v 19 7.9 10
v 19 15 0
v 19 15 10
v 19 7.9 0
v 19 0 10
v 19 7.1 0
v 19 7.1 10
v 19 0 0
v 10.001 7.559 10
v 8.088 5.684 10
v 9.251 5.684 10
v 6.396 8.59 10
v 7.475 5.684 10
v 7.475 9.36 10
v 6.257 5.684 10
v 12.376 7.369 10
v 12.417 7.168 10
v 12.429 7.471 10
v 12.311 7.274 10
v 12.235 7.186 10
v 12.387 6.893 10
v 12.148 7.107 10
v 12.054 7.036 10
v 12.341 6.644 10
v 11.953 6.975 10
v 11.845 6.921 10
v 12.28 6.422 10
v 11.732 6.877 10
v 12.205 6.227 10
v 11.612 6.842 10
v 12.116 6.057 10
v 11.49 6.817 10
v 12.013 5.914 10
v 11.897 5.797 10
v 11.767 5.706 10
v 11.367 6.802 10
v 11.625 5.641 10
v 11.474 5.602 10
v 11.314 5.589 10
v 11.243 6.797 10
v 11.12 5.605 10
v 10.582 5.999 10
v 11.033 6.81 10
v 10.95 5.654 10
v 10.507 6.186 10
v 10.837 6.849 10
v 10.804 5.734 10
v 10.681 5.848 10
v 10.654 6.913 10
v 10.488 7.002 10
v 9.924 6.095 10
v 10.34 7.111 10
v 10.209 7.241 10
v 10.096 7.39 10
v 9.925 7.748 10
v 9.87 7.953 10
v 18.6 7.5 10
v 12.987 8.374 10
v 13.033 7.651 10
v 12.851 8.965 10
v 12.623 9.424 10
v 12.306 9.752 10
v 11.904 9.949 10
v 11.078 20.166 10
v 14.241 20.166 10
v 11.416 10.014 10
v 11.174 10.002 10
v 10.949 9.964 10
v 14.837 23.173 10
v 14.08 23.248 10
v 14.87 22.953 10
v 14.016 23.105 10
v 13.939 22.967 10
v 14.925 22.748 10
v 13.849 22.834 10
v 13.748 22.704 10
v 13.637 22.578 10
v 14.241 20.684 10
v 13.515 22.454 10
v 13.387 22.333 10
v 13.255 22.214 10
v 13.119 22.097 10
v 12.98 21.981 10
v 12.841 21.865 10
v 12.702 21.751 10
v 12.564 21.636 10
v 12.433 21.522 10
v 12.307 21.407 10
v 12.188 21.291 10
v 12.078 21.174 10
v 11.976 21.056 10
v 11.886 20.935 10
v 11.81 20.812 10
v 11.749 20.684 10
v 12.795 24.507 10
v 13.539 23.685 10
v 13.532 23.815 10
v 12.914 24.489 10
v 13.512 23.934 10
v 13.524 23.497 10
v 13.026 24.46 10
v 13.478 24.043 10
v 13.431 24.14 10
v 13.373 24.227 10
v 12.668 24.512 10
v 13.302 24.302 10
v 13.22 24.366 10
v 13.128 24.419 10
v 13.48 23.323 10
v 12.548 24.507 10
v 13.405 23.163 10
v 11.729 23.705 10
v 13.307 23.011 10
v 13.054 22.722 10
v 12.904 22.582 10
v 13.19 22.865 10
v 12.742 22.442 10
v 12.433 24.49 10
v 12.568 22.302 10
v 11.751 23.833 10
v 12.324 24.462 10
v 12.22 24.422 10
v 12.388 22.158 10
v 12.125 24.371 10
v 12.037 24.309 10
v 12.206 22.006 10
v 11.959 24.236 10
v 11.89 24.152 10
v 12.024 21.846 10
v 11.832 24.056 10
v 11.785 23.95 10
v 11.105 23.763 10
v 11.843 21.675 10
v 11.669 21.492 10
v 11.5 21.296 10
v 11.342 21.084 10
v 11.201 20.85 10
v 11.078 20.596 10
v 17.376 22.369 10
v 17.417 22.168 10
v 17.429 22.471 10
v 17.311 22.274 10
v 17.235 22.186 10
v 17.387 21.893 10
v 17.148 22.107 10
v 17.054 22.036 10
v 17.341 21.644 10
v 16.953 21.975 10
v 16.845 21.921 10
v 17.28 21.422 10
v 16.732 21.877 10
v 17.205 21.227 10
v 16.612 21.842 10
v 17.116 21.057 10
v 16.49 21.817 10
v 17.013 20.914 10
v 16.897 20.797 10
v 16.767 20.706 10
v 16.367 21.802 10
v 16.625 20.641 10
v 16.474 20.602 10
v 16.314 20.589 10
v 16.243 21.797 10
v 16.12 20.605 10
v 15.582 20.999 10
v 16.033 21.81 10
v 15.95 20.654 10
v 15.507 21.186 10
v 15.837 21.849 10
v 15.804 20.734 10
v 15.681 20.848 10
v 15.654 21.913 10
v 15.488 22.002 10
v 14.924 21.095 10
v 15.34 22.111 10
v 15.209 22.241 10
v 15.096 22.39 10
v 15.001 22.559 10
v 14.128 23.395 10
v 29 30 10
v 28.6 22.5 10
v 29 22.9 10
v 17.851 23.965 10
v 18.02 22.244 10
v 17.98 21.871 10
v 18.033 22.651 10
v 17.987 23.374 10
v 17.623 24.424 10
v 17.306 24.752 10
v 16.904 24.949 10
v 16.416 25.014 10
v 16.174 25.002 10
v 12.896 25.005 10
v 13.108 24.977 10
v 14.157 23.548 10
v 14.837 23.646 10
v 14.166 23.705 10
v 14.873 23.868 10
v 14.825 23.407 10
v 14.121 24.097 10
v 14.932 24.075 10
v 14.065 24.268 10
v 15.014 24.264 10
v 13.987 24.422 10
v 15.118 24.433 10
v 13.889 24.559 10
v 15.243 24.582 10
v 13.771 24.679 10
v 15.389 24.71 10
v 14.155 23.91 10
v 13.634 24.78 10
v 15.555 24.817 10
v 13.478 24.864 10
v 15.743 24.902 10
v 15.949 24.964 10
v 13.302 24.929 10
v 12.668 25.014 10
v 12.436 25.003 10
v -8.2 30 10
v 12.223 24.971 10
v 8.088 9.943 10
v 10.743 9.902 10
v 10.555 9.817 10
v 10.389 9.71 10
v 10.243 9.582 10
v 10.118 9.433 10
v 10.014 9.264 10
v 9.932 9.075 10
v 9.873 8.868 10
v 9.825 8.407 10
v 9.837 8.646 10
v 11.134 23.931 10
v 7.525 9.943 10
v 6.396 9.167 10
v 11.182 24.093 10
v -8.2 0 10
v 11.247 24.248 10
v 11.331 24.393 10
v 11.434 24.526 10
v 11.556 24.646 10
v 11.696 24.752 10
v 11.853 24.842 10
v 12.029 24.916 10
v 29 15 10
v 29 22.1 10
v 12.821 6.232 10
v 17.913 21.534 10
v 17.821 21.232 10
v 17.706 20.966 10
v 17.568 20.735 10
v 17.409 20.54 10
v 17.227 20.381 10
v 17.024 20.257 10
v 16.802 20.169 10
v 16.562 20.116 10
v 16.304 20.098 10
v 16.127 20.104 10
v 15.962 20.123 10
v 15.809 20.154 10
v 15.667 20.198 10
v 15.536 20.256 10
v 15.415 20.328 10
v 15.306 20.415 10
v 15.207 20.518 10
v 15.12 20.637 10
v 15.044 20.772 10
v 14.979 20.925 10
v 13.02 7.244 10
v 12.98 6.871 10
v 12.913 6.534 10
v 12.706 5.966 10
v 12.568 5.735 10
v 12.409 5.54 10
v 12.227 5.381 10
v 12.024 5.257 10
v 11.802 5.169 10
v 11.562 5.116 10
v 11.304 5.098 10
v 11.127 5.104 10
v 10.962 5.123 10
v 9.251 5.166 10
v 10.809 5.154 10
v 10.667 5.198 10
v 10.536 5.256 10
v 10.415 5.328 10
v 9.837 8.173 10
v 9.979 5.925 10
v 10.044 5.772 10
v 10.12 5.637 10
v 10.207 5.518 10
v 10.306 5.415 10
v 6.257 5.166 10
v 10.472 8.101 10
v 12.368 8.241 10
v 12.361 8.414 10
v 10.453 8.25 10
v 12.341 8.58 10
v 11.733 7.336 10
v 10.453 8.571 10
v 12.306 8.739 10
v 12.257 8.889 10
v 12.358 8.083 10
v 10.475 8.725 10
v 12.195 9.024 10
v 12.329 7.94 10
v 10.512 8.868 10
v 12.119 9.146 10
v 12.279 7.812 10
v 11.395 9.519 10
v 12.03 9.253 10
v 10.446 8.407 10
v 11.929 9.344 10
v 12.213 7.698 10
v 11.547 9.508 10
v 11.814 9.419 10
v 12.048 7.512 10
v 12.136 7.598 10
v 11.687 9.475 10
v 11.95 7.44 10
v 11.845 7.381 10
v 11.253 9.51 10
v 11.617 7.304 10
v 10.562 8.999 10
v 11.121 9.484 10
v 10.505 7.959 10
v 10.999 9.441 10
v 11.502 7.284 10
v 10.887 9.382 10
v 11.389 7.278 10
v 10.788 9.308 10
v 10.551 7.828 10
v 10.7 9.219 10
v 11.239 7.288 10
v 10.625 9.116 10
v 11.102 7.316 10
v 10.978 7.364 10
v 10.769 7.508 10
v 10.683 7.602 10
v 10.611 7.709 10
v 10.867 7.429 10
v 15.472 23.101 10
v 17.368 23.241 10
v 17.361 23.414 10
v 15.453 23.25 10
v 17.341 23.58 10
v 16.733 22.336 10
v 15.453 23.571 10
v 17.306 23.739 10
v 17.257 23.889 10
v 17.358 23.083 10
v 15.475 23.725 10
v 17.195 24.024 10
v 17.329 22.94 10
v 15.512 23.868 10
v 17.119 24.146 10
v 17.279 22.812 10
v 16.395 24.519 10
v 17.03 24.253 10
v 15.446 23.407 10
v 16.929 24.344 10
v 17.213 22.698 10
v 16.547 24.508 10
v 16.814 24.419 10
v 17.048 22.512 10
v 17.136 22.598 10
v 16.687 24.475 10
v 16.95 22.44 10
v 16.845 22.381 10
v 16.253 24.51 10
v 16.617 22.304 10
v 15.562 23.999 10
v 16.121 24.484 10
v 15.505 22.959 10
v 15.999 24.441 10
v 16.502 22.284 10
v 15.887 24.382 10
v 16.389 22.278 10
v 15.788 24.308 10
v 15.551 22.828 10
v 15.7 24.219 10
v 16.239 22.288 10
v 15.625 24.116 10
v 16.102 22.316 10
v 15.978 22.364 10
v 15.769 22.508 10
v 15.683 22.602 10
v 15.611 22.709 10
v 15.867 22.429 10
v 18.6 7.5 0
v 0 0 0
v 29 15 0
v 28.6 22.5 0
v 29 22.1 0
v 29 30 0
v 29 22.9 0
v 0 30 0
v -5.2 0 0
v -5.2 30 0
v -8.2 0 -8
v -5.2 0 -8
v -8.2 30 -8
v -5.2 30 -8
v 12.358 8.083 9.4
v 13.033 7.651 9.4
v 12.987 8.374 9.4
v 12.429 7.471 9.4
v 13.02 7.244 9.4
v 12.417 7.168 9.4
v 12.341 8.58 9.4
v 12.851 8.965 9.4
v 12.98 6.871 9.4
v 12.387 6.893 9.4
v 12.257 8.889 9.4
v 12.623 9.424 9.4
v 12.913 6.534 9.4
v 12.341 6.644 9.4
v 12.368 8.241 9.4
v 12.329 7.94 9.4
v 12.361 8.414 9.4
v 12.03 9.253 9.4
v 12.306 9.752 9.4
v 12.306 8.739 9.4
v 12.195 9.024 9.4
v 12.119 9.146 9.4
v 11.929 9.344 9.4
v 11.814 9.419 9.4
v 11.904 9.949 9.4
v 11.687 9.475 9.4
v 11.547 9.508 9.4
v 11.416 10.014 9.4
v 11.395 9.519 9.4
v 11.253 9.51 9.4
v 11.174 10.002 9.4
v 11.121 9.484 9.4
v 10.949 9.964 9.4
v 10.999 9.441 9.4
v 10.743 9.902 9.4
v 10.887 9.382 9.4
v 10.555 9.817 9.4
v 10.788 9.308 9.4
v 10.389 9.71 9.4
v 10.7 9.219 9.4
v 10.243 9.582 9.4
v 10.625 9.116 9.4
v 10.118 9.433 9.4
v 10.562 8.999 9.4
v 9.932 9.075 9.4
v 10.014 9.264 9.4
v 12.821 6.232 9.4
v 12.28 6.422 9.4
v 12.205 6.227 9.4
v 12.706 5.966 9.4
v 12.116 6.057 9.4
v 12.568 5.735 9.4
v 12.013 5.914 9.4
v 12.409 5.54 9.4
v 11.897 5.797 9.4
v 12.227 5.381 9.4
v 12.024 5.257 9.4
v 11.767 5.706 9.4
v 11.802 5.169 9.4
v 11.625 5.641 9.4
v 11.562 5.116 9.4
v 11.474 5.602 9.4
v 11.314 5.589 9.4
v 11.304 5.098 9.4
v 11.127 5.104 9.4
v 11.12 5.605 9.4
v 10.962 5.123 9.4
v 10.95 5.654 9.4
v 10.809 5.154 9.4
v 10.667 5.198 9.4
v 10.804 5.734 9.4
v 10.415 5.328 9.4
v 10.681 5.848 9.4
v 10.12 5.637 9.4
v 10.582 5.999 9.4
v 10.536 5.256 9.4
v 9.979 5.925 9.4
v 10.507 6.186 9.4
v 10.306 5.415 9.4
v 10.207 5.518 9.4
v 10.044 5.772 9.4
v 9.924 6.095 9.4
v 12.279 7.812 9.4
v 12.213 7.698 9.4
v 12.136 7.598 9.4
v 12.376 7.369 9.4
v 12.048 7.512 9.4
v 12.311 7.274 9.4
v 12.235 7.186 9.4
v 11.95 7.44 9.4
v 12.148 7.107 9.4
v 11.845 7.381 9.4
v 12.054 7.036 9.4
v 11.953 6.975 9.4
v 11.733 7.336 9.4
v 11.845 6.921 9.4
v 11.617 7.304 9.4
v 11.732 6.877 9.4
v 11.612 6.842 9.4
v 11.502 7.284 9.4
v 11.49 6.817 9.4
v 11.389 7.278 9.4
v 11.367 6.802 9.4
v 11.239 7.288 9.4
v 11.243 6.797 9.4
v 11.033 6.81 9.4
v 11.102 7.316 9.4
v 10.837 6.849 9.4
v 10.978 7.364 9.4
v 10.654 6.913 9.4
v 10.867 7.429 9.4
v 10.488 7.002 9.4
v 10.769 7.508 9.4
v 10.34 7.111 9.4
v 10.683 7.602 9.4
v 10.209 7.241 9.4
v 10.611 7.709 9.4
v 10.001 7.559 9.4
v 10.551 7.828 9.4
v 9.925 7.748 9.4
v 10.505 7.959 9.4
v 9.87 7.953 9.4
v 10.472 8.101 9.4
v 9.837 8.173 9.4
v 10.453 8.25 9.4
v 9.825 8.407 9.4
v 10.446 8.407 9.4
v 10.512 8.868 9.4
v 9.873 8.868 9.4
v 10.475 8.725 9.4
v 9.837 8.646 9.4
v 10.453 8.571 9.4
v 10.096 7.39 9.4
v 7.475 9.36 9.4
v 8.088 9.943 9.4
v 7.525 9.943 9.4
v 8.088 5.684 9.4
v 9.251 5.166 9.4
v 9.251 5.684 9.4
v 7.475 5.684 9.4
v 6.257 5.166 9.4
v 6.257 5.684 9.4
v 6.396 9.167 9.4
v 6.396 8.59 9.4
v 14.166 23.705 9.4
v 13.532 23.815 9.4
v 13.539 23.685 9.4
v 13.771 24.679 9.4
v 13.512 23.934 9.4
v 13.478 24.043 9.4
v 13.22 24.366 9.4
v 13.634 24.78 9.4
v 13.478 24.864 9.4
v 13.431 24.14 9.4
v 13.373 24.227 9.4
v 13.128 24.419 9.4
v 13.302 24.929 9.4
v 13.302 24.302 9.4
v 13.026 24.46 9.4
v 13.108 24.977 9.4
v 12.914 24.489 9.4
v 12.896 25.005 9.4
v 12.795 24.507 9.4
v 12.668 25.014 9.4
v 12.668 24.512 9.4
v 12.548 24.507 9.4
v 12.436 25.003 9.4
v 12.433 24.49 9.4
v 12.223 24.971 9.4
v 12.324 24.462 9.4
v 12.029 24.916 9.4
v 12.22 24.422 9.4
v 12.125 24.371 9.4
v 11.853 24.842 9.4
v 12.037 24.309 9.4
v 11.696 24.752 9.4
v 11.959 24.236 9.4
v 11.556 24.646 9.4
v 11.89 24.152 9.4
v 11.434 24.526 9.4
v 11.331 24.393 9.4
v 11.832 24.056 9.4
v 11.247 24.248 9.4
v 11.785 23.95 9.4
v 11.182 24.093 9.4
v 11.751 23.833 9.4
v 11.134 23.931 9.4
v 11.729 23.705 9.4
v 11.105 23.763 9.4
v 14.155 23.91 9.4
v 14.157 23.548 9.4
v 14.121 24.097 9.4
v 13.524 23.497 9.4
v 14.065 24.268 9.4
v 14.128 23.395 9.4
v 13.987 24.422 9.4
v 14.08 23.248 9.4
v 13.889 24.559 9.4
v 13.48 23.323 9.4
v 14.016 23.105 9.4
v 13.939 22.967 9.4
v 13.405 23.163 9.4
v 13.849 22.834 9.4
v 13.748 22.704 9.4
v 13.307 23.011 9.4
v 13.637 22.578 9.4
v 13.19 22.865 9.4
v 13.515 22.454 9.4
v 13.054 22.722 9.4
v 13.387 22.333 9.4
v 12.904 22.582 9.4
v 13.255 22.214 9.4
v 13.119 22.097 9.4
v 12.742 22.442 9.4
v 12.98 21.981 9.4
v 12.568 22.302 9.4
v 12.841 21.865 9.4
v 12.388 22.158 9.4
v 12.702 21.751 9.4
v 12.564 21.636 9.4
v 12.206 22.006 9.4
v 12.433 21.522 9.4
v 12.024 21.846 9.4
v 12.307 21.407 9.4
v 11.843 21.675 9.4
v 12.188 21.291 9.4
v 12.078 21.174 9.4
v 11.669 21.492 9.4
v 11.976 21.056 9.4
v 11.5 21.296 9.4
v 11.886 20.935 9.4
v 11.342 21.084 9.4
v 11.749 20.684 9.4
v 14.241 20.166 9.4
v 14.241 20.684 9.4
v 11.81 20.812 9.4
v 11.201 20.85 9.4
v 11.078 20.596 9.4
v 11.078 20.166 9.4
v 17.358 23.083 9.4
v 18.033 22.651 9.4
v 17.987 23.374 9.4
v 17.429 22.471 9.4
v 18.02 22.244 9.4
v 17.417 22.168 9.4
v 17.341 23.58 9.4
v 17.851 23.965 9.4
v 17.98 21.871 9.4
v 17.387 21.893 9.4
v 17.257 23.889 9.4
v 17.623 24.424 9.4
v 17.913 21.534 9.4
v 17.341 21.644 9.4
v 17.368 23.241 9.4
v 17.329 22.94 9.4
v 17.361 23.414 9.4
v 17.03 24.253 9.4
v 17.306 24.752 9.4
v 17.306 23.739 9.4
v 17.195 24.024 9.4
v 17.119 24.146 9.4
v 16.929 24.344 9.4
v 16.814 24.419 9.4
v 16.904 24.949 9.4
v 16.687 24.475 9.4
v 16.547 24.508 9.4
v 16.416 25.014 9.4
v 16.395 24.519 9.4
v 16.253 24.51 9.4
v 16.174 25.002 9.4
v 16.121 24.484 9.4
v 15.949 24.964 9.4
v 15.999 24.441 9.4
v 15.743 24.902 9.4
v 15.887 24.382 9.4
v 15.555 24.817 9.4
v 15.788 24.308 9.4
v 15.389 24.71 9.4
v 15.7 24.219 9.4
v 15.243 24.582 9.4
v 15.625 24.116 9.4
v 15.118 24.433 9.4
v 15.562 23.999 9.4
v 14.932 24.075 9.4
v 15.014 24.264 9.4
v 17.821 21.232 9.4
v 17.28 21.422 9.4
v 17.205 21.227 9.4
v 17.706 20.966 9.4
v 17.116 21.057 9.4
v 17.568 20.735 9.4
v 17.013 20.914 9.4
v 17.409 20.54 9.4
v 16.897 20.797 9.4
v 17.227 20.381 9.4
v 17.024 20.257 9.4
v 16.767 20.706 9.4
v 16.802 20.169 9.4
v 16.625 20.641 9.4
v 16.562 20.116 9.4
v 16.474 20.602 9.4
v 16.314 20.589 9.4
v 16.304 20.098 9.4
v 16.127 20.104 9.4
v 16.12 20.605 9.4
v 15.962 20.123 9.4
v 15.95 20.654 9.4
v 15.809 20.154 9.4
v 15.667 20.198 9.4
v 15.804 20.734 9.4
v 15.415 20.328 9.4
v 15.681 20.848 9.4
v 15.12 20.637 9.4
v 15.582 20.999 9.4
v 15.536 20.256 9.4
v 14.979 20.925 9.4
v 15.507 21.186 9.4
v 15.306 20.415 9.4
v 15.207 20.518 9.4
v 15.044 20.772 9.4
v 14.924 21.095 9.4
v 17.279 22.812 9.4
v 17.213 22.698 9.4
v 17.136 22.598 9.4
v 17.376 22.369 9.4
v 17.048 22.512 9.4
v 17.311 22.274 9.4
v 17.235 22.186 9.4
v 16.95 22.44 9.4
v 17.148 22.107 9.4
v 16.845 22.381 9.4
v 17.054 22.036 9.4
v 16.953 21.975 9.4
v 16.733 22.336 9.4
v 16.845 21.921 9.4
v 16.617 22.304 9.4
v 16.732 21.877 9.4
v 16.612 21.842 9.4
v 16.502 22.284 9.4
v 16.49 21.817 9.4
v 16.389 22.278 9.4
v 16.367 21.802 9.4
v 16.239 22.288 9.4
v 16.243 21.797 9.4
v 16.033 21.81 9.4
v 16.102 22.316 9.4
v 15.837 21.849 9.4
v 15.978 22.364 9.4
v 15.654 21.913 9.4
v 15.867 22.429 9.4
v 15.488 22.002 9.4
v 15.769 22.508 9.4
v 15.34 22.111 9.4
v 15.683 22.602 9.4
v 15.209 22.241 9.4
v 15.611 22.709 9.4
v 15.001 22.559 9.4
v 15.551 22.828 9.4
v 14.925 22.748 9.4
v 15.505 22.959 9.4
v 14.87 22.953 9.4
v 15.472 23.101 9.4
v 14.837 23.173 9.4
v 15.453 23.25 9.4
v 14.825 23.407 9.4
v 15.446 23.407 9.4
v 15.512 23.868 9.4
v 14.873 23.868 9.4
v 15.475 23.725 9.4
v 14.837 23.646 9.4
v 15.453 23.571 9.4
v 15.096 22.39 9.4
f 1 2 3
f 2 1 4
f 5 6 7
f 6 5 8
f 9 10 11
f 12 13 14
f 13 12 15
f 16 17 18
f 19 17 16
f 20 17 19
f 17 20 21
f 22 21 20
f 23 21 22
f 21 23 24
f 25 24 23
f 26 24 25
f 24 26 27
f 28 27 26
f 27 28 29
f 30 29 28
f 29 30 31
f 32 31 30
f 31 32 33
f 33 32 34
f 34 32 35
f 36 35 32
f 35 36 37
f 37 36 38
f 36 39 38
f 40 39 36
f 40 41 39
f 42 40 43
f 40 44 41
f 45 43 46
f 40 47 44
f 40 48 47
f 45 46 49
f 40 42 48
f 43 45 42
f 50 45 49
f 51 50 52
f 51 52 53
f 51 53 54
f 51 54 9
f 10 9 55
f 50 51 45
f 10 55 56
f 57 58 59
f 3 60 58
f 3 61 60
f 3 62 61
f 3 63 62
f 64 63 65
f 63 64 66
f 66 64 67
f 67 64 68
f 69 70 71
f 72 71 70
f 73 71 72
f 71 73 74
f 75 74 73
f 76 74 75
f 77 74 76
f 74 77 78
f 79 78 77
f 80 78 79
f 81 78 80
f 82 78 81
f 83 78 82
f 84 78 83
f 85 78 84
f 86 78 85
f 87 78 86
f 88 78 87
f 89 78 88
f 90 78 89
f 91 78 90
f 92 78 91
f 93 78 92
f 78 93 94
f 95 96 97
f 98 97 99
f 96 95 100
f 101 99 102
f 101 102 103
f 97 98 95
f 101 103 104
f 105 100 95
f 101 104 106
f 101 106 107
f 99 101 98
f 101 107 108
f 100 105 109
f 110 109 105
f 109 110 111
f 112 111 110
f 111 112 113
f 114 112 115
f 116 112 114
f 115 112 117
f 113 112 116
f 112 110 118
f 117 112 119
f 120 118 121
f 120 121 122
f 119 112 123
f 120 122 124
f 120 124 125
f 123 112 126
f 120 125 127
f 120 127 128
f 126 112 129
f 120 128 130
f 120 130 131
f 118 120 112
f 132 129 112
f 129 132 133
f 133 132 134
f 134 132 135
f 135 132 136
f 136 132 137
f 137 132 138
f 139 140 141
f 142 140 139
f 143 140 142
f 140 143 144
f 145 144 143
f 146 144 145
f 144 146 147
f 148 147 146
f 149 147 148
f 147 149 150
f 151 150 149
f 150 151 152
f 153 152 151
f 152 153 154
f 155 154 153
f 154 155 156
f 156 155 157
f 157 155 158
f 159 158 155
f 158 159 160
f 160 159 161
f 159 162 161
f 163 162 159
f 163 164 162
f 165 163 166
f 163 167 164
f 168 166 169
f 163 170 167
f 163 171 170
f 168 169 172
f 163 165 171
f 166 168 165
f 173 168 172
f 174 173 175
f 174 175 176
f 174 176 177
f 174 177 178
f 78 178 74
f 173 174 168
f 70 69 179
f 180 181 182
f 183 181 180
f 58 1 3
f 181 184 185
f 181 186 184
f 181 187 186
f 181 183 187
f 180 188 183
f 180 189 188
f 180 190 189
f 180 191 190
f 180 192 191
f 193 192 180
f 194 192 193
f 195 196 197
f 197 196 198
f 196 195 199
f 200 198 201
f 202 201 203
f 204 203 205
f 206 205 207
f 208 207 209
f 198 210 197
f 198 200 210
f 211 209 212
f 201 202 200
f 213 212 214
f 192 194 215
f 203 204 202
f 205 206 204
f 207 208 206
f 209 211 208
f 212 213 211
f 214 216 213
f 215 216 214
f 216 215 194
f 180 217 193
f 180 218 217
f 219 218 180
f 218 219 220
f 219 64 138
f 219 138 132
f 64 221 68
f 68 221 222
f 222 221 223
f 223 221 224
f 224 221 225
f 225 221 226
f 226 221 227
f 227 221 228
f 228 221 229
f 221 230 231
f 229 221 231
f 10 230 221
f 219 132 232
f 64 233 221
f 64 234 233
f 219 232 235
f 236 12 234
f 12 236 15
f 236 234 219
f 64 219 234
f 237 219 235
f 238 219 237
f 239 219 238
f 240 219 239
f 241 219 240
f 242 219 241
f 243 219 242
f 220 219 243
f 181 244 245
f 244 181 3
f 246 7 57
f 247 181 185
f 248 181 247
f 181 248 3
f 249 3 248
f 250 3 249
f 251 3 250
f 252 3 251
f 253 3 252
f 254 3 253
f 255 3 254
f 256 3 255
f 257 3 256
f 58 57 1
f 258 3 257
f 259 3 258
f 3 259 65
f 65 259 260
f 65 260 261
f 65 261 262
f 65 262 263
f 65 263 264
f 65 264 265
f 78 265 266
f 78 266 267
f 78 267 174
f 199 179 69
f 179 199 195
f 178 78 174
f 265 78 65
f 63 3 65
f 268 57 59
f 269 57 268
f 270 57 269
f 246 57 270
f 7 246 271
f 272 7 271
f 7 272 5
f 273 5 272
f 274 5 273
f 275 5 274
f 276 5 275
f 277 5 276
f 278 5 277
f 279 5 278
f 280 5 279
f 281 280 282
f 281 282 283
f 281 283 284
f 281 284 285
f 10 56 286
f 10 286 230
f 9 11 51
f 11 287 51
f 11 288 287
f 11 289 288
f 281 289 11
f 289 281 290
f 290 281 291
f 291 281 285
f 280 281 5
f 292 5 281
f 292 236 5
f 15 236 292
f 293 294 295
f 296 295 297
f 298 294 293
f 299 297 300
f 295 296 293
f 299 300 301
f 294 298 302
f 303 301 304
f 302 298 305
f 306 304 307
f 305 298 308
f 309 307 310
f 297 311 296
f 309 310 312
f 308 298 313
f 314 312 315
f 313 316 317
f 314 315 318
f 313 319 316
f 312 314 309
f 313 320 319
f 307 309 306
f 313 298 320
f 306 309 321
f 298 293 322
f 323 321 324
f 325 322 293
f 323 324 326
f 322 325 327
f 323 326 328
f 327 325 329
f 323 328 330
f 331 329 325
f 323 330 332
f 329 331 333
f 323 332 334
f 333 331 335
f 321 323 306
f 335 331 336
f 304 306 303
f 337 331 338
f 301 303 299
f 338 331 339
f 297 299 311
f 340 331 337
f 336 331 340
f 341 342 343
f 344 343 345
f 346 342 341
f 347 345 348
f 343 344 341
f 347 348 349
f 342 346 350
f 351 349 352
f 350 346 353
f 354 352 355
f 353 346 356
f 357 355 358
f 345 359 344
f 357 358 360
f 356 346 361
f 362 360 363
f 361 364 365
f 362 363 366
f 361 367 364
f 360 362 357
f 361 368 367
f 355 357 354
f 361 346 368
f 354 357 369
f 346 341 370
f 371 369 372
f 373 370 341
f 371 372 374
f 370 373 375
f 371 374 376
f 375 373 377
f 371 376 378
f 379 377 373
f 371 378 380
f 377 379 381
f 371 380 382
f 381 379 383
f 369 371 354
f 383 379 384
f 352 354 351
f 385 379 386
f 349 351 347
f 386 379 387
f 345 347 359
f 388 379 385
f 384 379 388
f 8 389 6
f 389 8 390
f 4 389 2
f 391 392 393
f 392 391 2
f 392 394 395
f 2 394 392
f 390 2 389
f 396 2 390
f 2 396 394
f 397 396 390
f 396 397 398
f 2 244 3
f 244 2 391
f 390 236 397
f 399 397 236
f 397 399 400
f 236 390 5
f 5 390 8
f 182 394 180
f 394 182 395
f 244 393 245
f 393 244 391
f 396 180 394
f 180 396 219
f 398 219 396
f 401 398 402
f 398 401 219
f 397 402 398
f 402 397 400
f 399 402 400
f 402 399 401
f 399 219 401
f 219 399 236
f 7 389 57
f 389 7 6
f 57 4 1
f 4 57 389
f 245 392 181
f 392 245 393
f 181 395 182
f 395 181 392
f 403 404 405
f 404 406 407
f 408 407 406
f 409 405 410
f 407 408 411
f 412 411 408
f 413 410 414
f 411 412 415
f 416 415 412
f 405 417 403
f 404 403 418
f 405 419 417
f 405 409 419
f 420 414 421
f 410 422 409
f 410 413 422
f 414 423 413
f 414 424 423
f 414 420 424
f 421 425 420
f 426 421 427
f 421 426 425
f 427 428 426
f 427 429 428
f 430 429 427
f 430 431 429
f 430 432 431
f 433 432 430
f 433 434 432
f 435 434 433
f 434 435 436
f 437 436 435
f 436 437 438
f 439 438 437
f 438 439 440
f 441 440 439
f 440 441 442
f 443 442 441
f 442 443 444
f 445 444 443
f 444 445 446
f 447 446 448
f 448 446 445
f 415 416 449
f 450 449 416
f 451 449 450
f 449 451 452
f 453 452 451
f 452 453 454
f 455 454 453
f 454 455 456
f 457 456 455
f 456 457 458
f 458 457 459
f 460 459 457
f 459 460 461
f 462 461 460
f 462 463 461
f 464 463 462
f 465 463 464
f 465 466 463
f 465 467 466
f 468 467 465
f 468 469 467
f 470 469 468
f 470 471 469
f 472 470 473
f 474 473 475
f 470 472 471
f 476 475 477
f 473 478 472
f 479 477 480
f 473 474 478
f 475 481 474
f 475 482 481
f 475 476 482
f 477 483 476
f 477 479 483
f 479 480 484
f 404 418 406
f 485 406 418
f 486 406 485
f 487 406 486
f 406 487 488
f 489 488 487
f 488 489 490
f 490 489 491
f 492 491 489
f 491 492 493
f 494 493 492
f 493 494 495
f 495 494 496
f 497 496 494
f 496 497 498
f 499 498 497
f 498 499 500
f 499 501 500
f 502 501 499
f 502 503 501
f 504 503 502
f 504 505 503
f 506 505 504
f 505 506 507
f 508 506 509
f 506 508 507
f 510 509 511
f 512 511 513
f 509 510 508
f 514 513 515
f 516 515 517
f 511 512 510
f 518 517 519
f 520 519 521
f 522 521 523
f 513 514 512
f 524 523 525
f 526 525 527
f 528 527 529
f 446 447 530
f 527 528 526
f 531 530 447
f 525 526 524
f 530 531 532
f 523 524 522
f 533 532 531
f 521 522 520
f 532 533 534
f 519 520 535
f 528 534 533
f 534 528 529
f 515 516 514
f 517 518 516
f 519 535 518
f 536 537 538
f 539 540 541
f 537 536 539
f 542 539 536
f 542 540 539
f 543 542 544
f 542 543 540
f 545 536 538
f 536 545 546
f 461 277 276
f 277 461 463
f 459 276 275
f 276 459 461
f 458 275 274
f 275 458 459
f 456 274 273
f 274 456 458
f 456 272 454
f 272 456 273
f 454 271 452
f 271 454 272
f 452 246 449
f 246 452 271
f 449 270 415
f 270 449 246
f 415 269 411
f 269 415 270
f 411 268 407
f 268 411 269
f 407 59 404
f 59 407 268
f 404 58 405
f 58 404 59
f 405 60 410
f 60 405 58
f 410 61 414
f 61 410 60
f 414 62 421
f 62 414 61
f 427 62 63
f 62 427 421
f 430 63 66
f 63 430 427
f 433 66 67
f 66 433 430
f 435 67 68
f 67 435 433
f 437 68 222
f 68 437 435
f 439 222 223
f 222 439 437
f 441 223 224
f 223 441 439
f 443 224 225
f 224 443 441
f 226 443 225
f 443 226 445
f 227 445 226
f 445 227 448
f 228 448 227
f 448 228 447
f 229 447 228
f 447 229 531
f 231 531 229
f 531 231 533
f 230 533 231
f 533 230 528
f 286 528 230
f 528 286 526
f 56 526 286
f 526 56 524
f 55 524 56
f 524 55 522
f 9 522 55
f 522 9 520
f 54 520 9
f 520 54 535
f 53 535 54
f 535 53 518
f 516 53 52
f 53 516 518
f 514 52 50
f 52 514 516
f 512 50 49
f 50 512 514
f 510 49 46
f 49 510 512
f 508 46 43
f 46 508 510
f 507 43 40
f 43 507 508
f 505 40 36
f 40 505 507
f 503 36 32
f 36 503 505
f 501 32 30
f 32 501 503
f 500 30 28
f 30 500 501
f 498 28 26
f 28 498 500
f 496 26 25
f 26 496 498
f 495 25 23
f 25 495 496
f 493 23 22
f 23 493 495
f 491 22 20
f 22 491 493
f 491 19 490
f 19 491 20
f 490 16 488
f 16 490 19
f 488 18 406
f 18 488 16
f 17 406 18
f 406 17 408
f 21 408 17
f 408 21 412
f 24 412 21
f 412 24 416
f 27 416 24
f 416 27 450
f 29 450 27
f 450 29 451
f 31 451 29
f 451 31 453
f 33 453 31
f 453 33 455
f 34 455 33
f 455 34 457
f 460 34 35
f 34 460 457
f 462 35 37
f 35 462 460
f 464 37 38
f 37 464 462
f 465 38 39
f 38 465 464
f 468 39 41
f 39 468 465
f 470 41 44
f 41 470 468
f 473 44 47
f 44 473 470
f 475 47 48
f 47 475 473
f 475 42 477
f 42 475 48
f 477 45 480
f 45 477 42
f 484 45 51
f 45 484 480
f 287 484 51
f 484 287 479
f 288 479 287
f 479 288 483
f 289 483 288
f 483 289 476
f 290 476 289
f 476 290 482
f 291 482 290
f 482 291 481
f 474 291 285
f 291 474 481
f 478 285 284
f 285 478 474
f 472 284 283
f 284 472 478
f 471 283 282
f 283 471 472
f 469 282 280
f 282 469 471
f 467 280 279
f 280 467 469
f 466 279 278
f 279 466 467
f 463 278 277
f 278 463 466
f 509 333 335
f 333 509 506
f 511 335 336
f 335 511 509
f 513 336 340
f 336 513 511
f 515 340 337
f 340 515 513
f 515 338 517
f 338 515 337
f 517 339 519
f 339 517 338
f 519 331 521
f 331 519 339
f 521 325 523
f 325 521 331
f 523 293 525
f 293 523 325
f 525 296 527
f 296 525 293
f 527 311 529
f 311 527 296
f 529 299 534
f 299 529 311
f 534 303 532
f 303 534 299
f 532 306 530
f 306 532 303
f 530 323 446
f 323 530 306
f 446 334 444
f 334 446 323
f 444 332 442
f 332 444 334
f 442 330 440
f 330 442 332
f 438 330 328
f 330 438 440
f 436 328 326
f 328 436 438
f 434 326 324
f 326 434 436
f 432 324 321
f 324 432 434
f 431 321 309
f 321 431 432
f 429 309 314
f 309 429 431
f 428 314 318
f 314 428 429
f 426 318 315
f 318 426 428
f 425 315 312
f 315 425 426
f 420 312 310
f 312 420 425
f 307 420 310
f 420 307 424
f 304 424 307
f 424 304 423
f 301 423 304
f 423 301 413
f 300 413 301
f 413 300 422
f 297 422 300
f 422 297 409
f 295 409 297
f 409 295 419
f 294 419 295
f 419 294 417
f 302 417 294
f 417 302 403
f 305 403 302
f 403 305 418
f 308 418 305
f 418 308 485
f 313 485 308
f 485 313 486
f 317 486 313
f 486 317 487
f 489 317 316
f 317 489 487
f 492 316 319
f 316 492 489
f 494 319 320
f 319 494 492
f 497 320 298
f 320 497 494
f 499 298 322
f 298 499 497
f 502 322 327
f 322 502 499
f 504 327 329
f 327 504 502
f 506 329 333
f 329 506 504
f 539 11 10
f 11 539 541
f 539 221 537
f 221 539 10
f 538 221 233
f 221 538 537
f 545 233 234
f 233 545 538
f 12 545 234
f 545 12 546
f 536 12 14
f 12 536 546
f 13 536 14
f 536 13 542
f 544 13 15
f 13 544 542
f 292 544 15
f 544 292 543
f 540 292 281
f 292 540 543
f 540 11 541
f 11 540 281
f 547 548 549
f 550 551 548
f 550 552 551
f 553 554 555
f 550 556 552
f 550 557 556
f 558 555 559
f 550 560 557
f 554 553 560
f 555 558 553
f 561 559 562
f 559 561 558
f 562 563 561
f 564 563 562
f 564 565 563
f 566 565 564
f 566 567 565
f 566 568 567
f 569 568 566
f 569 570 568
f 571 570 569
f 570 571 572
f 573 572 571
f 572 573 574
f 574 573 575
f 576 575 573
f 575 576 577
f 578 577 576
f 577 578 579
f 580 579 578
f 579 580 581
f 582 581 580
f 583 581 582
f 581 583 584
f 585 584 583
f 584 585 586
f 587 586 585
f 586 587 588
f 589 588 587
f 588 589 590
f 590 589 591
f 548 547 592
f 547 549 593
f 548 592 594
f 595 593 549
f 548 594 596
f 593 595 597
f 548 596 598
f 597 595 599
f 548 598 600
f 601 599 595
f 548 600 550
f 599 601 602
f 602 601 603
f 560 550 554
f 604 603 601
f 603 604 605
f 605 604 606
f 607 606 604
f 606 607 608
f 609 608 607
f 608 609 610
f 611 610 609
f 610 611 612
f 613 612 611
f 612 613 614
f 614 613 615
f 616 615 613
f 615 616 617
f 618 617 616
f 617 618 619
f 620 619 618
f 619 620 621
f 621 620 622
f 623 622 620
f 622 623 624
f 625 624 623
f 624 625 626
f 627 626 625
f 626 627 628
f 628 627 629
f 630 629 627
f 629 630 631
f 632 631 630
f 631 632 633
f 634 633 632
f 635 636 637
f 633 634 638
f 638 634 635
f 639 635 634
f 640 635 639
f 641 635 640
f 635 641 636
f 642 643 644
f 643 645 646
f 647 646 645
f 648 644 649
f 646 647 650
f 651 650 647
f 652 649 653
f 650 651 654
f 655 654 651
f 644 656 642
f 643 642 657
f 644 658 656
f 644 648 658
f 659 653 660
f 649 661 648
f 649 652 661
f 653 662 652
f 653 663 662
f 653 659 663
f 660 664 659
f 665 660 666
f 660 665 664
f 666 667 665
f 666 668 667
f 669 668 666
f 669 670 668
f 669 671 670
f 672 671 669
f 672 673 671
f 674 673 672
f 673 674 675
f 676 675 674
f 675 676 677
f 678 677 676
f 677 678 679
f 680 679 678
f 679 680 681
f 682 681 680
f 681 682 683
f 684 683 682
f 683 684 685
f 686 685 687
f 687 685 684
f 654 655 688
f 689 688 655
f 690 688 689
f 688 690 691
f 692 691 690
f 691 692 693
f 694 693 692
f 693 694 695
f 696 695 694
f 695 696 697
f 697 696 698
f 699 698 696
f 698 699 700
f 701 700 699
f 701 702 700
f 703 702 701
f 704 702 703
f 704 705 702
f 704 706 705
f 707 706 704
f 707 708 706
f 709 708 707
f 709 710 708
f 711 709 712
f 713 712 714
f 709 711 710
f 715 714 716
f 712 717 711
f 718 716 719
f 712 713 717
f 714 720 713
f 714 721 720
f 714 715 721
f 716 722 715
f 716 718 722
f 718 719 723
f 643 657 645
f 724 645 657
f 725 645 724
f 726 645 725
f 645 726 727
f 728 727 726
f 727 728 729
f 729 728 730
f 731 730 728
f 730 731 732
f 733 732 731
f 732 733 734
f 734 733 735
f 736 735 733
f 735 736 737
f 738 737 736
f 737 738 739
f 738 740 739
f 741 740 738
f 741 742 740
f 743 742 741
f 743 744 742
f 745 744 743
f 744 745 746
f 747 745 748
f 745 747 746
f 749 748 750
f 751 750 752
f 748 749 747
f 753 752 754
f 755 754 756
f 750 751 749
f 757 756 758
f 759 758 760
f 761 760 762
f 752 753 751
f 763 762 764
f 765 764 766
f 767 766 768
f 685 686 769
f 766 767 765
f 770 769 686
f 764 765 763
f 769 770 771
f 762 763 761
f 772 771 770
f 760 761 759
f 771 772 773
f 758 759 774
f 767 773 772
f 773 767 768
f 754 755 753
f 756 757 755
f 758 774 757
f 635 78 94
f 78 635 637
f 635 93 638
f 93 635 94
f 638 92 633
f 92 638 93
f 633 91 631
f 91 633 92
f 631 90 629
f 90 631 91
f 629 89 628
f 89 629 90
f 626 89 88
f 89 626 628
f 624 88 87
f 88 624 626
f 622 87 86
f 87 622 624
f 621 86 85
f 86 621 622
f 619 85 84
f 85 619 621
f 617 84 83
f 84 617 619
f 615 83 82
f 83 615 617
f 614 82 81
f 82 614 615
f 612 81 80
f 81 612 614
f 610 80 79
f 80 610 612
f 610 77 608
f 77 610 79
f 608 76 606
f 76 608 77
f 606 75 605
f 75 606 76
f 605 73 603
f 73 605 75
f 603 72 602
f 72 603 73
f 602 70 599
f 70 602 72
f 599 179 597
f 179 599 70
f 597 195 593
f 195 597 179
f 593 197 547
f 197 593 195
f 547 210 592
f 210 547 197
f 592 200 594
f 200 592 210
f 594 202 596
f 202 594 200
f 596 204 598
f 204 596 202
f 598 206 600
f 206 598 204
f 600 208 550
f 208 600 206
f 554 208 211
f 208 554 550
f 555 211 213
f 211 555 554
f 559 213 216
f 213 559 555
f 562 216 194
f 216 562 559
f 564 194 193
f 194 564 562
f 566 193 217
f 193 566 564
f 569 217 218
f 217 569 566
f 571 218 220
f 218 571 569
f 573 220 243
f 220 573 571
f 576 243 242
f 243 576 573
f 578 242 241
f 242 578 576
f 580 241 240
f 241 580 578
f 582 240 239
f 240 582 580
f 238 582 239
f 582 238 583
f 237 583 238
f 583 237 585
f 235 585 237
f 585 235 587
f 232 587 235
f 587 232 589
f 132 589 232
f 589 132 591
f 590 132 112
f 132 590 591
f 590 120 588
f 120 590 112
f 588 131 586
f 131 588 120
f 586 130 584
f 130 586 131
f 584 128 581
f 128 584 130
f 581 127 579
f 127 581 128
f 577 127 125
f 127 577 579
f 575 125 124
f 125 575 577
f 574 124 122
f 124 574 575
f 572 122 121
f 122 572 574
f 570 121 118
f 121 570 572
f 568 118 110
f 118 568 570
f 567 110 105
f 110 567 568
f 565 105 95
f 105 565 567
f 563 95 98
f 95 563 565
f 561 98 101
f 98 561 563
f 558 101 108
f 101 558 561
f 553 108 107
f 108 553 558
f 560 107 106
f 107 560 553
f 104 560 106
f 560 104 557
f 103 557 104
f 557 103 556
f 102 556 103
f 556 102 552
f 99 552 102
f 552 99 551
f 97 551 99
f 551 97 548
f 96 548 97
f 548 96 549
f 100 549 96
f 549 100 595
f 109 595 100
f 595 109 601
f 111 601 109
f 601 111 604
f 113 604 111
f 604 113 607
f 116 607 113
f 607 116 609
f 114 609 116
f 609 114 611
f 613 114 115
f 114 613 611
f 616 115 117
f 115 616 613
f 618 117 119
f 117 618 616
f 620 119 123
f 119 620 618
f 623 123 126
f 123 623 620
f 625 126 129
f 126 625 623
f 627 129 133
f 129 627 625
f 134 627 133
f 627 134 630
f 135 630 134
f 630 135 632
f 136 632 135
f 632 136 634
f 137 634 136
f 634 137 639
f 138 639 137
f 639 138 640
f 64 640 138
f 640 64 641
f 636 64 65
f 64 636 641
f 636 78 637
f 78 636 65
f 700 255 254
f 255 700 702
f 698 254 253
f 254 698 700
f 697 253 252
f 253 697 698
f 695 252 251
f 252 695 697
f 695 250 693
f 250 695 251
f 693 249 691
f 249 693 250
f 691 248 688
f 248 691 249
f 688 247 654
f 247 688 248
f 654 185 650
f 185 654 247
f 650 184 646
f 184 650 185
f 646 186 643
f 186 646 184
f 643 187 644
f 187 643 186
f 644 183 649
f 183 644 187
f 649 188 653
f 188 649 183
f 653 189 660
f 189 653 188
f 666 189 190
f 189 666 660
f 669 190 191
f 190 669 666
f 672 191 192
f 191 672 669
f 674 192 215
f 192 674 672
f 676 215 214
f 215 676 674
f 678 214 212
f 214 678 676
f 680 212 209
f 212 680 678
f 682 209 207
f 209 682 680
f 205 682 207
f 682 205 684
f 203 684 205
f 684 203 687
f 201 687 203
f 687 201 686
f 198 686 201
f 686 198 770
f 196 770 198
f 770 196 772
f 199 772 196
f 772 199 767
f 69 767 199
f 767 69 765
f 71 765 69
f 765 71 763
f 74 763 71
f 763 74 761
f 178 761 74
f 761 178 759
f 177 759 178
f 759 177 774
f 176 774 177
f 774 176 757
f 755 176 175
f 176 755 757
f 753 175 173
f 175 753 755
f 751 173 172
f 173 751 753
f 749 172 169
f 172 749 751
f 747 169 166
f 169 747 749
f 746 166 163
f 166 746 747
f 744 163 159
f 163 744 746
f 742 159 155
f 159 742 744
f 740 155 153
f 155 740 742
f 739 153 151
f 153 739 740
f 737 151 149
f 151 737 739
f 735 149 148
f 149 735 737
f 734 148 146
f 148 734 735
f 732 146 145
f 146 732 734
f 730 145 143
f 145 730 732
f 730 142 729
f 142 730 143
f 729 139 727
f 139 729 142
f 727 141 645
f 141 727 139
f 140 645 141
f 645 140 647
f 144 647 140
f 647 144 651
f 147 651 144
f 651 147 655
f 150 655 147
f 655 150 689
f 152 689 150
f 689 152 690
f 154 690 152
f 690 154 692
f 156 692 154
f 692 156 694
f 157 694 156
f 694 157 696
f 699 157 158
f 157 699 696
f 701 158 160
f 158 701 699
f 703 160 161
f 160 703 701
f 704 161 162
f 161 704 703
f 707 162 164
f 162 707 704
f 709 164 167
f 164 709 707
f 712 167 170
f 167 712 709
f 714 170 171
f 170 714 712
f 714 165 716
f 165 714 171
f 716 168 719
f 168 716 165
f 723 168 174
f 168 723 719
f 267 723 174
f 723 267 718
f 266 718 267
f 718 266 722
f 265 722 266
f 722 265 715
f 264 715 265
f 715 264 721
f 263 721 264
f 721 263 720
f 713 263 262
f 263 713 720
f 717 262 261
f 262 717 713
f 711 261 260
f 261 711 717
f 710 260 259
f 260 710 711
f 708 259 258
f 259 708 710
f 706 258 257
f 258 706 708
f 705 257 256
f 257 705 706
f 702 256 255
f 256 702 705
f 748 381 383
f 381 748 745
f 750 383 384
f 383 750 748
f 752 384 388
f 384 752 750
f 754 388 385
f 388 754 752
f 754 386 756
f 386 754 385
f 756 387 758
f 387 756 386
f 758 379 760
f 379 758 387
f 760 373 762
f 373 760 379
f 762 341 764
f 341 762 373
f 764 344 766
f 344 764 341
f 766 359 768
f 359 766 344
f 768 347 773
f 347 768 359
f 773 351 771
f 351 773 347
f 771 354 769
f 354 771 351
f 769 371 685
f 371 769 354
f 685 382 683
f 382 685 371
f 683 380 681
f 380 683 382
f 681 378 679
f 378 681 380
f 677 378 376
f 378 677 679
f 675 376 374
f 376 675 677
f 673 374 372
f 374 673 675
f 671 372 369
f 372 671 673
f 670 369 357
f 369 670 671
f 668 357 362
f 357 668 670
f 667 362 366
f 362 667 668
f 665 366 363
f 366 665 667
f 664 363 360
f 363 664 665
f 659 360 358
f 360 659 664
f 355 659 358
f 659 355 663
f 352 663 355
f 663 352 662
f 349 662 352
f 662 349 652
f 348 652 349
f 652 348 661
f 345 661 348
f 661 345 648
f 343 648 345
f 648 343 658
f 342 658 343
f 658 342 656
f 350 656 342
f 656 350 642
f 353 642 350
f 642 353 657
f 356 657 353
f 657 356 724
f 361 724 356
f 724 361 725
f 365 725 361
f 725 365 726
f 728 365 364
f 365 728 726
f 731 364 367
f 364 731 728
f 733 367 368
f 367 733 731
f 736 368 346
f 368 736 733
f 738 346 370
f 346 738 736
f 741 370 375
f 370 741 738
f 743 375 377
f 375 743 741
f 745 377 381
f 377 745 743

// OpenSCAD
// Rail marking gauge. Hooks over any edge of the 2 x 2 x 3/16 in angle and gives a pencil
// notch at 19 mm (the screw line, hooked over the flat leg's free edge) and at 29 mm (the
// bolt line, hooked over the heel edge). Slide it along the rail with a pencil in the notch.
// Print flat, the hook pointing up. Any filament.

leg_t    = 4.8;   // angle thickness
slack    = 0.4;   // hook clearance over the leg
hook_h   = 8;     // how far the hook reaches down the leg
body_t   = 10;    // gauge thickness
w        = 30;    // width along the rail
d19      = 19;
d29      = 29;
notch    = 2.4;   // pencil notch width

pencil_tip = 0.8;   // the pencil's point diameter; the V's apex sits this far short of the distance so the pencil centre lands on it
module notch_at(x, y0, y1) {               // V notch cut into an end face, through the full thickness, apex at x - pencil_tip/2
    translate([x - pencil_tip / 2 + notch * 0.7071, (y0 + y1) / 2, body_t / 2])
        rotate([0, 0, 45]) cube([notch, notch, body_t + 2], center = true);
}

difference() {
    union() {
        // body: left half reaches 19 mm, right half reaches 29 mm from the hook's inner face
        translate([0, 0, 0]) cube([d19, w / 2, body_t]);
        translate([0, w / 2, 0]) cube([d29, w / 2, body_t]);
        // hook: a lip that drops over the edge; its inner face is x = 0
        translate([-(leg_t + slack + 3), 0, -hook_h]) cube([3, w, hook_h + body_t]);
        translate([-(leg_t + slack), 0, 0]) cube([leg_t + slack, w, body_t]);   // bridge over the edge
    }
    // the slot the leg sits in
    translate([-(leg_t + slack), -1, -hook_h - 1]) cube([leg_t + slack, w + 2, hook_h + 1]);
    // pencil notches on the two end faces
    notch_at(d19, 0, w / 2);
    notch_at(d29, w / 2, w);
    // labels
    translate([d19 / 2, w / 4, body_t - 0.6]) linear_extrude(1) text("19", size = 5, halign = "center", valign = "center");
    translate([d29 / 2, 3 * w / 4, body_t - 0.6]) linear_extrude(1) text("29", size = 5, halign = "center", valign = "center");
}
